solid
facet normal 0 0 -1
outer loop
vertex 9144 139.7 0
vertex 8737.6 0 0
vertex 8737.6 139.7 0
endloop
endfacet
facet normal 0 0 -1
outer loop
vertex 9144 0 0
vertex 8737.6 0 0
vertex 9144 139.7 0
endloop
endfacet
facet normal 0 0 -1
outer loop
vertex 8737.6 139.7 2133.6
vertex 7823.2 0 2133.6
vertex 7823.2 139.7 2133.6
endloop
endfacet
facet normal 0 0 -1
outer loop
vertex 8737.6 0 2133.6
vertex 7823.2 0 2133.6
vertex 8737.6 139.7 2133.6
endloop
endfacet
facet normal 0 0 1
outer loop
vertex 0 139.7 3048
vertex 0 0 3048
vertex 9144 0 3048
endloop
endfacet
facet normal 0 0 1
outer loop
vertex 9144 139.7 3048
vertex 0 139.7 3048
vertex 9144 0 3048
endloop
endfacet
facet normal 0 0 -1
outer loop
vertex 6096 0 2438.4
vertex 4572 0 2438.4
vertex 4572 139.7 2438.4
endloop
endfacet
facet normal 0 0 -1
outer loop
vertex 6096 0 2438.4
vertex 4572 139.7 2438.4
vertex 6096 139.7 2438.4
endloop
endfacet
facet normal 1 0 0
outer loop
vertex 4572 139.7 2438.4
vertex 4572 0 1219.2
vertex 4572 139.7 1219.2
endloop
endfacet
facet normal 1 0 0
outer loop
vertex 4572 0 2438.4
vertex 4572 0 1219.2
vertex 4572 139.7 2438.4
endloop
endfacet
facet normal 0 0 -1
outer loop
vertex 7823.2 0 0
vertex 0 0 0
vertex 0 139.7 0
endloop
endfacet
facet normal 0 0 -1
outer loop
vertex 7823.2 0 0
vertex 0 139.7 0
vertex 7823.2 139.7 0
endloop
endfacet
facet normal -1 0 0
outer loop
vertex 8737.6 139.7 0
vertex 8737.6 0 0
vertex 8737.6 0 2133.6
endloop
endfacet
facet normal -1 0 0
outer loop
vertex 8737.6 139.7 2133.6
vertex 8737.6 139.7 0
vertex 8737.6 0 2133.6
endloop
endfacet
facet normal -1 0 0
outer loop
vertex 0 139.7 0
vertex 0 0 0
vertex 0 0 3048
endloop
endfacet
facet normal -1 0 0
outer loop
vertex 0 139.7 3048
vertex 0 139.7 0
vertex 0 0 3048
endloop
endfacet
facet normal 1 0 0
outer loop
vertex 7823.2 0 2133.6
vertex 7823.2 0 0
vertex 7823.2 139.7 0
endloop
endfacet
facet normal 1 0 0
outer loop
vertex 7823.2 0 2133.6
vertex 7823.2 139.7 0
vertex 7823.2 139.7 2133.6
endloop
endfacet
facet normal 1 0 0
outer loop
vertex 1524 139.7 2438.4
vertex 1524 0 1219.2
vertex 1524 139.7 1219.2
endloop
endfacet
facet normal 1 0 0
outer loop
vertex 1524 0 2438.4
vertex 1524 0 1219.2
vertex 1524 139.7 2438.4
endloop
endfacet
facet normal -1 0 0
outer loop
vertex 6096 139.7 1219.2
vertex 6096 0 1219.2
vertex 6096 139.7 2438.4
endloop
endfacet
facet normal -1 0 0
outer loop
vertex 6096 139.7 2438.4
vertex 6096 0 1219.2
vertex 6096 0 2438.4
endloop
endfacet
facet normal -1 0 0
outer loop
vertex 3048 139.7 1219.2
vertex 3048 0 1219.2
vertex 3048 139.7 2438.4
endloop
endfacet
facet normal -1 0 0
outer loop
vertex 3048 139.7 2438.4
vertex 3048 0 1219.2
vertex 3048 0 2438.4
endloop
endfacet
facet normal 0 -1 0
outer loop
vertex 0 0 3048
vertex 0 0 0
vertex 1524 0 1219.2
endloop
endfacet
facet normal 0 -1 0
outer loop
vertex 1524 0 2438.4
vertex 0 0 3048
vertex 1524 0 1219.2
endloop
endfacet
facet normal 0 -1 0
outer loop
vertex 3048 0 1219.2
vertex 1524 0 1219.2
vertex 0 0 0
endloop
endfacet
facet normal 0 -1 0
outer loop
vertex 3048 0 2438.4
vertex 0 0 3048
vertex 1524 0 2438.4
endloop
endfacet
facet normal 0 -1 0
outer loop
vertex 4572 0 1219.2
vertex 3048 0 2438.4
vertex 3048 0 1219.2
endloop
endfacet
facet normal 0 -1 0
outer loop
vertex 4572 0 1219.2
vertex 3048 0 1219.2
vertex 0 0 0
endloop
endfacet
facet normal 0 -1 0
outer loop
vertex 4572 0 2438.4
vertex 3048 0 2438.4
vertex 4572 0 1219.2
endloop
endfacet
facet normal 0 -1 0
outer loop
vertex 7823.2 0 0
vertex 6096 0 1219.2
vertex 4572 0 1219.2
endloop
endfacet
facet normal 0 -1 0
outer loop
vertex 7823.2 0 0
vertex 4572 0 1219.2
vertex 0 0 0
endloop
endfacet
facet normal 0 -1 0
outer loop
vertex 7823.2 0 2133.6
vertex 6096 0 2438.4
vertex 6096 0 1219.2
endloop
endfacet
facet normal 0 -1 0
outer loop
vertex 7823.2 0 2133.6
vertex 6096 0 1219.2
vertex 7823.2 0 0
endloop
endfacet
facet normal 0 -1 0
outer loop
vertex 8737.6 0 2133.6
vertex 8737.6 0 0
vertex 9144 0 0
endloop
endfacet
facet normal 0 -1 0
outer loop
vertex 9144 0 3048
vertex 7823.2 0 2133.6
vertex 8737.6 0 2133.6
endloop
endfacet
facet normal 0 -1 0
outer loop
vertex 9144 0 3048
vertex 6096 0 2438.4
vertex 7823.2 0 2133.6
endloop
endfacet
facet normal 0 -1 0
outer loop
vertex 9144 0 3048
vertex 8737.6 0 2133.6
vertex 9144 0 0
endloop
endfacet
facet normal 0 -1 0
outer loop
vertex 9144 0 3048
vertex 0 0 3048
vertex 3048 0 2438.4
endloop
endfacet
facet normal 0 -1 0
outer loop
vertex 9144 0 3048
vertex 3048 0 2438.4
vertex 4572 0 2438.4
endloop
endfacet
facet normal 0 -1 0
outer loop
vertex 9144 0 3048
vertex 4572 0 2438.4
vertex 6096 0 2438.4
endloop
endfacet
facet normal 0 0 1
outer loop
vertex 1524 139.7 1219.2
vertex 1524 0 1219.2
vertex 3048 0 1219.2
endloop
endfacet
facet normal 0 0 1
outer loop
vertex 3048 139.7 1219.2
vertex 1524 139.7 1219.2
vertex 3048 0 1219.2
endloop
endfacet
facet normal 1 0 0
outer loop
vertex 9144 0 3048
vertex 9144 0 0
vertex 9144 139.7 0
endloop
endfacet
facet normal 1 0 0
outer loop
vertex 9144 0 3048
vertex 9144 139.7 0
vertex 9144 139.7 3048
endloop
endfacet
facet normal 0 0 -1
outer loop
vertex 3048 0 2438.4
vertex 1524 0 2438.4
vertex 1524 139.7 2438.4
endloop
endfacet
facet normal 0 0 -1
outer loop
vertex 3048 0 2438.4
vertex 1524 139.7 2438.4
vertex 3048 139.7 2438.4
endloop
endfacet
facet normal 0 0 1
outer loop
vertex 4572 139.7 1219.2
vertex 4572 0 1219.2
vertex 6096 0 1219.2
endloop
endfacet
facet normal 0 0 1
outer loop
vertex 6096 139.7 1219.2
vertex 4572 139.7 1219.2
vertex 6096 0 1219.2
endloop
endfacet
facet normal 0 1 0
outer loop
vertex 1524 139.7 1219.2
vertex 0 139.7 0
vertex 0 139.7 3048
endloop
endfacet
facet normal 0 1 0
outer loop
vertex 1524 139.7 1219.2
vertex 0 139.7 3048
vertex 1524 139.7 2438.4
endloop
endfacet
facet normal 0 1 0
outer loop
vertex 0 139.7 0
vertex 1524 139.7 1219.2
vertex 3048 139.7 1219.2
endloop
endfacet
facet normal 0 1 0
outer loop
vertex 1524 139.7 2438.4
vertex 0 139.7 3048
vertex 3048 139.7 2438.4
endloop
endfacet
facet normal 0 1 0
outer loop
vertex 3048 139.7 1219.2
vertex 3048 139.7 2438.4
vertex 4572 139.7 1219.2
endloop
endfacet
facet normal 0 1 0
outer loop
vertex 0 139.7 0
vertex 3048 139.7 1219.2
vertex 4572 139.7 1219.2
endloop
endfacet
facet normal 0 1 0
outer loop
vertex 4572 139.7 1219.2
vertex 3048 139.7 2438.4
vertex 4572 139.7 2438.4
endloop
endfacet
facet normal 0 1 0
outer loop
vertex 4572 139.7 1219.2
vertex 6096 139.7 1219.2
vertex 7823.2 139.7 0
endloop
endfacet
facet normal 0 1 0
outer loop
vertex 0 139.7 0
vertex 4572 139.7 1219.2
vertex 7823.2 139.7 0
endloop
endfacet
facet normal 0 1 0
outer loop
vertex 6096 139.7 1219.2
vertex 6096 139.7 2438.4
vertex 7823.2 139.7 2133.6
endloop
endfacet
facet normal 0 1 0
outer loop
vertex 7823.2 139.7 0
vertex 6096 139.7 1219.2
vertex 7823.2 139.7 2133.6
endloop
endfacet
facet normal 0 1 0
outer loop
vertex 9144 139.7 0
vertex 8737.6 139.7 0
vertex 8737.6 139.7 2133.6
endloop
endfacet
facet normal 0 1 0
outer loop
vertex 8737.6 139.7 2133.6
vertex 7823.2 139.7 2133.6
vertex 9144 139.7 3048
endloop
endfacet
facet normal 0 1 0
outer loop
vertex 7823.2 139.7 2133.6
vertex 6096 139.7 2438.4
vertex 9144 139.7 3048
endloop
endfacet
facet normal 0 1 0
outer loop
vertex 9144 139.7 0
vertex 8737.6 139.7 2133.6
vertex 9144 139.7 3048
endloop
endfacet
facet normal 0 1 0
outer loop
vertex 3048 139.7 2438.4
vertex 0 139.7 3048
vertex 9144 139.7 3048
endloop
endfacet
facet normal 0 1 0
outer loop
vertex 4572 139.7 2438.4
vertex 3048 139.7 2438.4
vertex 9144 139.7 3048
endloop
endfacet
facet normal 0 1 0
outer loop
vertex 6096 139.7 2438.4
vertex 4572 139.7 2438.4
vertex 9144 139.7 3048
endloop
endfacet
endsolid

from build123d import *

# Parameters (mm, degrees)
F0_W     = 9144
F0_H     = 3048
F1_DEPTH = 139.7
F2_W     = 1524
F2_H     = 1219.2
F3_DEPTH = 139.701
F4_W     = 914.4
F4_H     = 2133.6
F5_DEPTH = 139.701


with BuildPart() as f1:
    # F0 (on Front) → F1 (new body)
    with BuildSketch(Plane.XZ):
        with Locations((4572, 1524)):
            Rectangle(F0_W, F0_H)
    extrude(amount=-F1_DEPTH)

    # F2 (on face) → F3 (cut, through all)
    with BuildSketch(Plane.XZ):
        with Locations((2286, 1828.8)):
            Rectangle(F2_W, F2_H)
        with Locations((5334, 1828.8)):
            Rectangle(F2_W, F2_H)
    extrude(amount=-F3_DEPTH, mode=Mode.SUBTRACT)

    # F4 (on face) → F5 (cut, through all)
    with BuildSketch(Plane.XZ):
        with Locations((8280.4, 1066.8)):
            Rectangle(F4_W, F4_H)
    extrude(amount=-F5_DEPTH, mode=Mode.SUBTRACT)


solid = f1.part
